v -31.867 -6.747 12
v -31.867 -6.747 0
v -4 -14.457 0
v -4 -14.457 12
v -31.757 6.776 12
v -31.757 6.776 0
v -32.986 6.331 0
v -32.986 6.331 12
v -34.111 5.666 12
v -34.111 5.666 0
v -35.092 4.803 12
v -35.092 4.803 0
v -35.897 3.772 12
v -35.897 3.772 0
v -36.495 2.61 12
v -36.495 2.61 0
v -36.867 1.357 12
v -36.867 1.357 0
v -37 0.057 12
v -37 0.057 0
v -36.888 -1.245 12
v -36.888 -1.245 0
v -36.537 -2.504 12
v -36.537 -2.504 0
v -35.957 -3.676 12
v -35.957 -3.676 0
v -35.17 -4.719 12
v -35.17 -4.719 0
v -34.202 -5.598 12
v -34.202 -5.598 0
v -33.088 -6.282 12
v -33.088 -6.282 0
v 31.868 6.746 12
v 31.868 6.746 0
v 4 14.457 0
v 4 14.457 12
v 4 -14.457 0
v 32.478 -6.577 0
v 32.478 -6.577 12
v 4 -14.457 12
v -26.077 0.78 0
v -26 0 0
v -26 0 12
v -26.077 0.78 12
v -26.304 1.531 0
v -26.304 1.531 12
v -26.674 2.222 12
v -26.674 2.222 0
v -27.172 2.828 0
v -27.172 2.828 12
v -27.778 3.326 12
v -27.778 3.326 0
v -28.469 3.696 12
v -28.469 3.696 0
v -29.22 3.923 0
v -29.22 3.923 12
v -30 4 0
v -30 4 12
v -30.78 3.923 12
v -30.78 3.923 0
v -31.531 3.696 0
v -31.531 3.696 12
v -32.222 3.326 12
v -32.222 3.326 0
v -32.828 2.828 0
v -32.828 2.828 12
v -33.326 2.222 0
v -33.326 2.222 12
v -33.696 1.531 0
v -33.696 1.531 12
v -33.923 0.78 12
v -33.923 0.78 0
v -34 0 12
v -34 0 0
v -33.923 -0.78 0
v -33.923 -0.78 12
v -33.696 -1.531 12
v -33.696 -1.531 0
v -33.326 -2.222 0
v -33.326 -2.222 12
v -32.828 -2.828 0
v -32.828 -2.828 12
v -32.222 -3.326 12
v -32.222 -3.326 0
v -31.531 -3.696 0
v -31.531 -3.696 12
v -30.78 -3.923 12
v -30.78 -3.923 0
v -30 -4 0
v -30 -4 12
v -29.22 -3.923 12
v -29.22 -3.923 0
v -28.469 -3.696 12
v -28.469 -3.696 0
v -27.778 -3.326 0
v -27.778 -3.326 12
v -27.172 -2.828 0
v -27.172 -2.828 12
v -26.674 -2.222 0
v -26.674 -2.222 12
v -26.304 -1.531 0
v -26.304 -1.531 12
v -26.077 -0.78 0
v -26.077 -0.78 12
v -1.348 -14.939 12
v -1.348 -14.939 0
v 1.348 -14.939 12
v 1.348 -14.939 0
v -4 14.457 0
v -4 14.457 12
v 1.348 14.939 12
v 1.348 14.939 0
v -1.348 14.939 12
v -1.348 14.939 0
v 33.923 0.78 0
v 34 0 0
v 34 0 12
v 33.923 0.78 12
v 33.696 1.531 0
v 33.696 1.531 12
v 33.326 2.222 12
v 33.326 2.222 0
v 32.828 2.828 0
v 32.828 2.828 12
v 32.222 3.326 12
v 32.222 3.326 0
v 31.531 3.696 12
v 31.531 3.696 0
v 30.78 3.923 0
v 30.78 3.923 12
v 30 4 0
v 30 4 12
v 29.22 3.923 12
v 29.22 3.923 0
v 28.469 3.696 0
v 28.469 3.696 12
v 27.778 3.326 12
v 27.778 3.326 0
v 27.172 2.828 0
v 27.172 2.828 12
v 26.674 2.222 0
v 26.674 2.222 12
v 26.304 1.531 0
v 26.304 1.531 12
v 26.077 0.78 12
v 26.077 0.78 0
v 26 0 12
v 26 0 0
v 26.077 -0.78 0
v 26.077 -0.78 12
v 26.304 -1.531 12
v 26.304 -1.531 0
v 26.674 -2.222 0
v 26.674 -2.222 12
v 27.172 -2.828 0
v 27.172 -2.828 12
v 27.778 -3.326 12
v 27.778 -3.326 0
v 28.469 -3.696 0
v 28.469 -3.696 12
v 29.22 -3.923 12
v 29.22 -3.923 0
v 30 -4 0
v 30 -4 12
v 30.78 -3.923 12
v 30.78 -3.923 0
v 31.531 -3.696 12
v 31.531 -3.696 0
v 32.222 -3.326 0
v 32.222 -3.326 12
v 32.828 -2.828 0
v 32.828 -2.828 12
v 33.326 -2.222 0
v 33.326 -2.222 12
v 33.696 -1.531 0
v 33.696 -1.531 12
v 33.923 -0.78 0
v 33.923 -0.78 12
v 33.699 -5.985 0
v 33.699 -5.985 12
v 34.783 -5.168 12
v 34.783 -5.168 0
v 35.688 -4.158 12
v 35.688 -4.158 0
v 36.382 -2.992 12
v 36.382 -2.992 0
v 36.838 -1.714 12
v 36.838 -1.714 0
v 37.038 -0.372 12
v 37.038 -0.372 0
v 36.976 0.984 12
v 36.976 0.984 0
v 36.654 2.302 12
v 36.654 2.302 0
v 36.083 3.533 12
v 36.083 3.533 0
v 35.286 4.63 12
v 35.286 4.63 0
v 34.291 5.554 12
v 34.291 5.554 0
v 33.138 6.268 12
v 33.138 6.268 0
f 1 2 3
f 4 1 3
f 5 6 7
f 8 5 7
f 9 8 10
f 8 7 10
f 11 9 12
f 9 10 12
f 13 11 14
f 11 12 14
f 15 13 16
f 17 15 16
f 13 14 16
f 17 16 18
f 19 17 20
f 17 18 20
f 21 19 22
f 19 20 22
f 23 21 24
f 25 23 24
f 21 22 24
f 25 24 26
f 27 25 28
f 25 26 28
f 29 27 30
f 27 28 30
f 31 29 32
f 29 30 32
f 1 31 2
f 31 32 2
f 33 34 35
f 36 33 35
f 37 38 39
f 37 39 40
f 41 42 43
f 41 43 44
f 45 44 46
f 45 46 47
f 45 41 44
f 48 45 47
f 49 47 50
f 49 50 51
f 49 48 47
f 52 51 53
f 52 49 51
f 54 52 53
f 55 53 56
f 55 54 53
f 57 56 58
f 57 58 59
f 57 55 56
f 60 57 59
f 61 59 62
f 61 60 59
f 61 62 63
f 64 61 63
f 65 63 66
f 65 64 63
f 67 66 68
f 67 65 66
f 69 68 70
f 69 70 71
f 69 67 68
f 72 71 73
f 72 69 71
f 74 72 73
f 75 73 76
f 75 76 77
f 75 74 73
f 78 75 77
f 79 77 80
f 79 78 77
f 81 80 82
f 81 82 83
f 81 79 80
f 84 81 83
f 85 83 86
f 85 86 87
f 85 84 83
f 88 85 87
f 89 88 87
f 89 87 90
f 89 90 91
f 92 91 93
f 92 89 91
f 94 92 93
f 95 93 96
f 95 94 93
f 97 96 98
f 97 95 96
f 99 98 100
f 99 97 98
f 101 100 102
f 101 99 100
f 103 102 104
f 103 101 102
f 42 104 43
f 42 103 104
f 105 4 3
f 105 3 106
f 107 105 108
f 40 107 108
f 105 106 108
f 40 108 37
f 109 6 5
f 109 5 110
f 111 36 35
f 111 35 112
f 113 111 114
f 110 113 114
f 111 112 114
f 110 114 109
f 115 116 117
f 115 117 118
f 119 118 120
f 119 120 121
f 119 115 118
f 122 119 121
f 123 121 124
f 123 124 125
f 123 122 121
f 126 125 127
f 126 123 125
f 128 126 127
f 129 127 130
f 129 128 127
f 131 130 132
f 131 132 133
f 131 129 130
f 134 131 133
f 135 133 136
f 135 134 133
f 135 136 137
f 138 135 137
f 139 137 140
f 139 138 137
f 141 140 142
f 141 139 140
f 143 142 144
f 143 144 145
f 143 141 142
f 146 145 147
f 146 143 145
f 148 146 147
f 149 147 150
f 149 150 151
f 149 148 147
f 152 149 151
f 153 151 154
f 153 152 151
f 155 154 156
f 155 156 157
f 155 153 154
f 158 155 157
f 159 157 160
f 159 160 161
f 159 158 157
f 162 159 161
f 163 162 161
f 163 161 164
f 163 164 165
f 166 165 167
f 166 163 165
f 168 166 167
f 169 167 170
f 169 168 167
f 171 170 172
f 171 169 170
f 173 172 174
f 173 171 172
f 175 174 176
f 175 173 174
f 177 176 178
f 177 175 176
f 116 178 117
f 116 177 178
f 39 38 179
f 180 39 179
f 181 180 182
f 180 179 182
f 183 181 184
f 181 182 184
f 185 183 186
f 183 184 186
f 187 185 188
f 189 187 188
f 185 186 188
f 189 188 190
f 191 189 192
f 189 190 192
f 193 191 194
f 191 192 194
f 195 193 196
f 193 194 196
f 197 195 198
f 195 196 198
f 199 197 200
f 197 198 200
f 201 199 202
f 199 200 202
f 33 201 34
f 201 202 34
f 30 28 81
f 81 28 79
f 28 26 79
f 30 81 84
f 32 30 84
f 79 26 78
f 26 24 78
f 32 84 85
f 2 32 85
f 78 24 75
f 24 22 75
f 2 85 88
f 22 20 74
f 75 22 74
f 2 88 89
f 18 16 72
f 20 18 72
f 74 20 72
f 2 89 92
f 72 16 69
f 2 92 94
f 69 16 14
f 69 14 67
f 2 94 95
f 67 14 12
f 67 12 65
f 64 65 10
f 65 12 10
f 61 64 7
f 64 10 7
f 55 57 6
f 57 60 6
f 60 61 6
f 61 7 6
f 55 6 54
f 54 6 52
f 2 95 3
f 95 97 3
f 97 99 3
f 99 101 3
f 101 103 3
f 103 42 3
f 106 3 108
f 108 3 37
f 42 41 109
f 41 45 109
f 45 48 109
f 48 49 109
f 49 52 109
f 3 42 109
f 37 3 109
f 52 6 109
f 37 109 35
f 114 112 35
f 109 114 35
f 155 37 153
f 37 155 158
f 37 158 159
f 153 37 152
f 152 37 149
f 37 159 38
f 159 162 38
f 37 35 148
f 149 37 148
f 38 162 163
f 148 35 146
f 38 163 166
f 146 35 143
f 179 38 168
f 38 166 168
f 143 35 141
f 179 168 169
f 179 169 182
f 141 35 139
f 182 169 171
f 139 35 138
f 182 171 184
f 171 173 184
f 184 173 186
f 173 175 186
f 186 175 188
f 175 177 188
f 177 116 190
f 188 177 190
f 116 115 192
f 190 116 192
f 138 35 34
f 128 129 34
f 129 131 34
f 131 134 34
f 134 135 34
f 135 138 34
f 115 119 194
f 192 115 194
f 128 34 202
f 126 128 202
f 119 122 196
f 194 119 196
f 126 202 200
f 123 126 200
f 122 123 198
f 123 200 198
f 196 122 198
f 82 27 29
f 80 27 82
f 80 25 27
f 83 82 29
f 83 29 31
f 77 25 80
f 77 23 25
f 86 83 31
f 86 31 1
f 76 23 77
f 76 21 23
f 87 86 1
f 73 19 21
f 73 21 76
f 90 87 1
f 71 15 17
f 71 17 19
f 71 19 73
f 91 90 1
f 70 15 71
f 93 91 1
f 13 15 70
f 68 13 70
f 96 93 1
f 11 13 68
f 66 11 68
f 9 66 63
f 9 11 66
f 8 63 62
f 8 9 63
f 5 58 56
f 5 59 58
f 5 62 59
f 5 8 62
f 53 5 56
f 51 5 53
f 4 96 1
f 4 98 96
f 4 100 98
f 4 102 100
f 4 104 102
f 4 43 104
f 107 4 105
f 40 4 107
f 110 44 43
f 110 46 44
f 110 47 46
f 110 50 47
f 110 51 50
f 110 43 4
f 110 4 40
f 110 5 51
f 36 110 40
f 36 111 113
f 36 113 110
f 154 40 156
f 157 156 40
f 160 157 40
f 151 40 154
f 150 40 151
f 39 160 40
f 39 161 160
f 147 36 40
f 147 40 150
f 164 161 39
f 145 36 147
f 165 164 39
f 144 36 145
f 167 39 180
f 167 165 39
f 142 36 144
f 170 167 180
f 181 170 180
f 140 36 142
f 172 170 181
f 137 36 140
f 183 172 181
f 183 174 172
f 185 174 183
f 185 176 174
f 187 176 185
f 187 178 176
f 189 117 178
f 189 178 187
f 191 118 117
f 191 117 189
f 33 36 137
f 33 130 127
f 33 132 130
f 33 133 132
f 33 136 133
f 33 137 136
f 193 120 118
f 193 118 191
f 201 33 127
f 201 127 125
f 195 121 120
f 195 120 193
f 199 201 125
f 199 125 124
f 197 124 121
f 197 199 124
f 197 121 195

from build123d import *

# Parameters (mm, degrees)
SKETCH_R  = 4
PAD_DEPTH = 12


with BuildPart() as part:
    # Sketch → Pad (new body)
    with BuildSketch(Plane.XY):
        with BuildLine():
            ThreePointArc((-4, -14.456832), (0, -15), (4, -14.456832))
            Line((32.478293, -6.577294), (4, -14.456832))
            ThreePointArc((32.478293, -6.577294), (37.040054, 0.307444), (31.867844, 6.746196))
            Line((31.867844, 6.746196), (4, 14.456832))
            ThreePointArc((4, 14.456832), (0, 15), (-4, 14.456832))
            Line((-31.75668, 6.775993), (-4, 14.456832))
            ThreePointArc((-31.75668, 6.775993), (-36.999768, 0.056933), (-31.866667, -6.746522))
            Line((-31.866667, -6.746522), (-4, -14.456832))
        make_face()
        with Locations((-30, 0)):
            Circle(SKETCH_R, mode=Mode.SUBTRACT)
        with Locations((30, 0)):
            Circle(SKETCH_R, mode=Mode.SUBTRACT)
    extrude(amount=PAD_DEPTH)


solid = part.part
